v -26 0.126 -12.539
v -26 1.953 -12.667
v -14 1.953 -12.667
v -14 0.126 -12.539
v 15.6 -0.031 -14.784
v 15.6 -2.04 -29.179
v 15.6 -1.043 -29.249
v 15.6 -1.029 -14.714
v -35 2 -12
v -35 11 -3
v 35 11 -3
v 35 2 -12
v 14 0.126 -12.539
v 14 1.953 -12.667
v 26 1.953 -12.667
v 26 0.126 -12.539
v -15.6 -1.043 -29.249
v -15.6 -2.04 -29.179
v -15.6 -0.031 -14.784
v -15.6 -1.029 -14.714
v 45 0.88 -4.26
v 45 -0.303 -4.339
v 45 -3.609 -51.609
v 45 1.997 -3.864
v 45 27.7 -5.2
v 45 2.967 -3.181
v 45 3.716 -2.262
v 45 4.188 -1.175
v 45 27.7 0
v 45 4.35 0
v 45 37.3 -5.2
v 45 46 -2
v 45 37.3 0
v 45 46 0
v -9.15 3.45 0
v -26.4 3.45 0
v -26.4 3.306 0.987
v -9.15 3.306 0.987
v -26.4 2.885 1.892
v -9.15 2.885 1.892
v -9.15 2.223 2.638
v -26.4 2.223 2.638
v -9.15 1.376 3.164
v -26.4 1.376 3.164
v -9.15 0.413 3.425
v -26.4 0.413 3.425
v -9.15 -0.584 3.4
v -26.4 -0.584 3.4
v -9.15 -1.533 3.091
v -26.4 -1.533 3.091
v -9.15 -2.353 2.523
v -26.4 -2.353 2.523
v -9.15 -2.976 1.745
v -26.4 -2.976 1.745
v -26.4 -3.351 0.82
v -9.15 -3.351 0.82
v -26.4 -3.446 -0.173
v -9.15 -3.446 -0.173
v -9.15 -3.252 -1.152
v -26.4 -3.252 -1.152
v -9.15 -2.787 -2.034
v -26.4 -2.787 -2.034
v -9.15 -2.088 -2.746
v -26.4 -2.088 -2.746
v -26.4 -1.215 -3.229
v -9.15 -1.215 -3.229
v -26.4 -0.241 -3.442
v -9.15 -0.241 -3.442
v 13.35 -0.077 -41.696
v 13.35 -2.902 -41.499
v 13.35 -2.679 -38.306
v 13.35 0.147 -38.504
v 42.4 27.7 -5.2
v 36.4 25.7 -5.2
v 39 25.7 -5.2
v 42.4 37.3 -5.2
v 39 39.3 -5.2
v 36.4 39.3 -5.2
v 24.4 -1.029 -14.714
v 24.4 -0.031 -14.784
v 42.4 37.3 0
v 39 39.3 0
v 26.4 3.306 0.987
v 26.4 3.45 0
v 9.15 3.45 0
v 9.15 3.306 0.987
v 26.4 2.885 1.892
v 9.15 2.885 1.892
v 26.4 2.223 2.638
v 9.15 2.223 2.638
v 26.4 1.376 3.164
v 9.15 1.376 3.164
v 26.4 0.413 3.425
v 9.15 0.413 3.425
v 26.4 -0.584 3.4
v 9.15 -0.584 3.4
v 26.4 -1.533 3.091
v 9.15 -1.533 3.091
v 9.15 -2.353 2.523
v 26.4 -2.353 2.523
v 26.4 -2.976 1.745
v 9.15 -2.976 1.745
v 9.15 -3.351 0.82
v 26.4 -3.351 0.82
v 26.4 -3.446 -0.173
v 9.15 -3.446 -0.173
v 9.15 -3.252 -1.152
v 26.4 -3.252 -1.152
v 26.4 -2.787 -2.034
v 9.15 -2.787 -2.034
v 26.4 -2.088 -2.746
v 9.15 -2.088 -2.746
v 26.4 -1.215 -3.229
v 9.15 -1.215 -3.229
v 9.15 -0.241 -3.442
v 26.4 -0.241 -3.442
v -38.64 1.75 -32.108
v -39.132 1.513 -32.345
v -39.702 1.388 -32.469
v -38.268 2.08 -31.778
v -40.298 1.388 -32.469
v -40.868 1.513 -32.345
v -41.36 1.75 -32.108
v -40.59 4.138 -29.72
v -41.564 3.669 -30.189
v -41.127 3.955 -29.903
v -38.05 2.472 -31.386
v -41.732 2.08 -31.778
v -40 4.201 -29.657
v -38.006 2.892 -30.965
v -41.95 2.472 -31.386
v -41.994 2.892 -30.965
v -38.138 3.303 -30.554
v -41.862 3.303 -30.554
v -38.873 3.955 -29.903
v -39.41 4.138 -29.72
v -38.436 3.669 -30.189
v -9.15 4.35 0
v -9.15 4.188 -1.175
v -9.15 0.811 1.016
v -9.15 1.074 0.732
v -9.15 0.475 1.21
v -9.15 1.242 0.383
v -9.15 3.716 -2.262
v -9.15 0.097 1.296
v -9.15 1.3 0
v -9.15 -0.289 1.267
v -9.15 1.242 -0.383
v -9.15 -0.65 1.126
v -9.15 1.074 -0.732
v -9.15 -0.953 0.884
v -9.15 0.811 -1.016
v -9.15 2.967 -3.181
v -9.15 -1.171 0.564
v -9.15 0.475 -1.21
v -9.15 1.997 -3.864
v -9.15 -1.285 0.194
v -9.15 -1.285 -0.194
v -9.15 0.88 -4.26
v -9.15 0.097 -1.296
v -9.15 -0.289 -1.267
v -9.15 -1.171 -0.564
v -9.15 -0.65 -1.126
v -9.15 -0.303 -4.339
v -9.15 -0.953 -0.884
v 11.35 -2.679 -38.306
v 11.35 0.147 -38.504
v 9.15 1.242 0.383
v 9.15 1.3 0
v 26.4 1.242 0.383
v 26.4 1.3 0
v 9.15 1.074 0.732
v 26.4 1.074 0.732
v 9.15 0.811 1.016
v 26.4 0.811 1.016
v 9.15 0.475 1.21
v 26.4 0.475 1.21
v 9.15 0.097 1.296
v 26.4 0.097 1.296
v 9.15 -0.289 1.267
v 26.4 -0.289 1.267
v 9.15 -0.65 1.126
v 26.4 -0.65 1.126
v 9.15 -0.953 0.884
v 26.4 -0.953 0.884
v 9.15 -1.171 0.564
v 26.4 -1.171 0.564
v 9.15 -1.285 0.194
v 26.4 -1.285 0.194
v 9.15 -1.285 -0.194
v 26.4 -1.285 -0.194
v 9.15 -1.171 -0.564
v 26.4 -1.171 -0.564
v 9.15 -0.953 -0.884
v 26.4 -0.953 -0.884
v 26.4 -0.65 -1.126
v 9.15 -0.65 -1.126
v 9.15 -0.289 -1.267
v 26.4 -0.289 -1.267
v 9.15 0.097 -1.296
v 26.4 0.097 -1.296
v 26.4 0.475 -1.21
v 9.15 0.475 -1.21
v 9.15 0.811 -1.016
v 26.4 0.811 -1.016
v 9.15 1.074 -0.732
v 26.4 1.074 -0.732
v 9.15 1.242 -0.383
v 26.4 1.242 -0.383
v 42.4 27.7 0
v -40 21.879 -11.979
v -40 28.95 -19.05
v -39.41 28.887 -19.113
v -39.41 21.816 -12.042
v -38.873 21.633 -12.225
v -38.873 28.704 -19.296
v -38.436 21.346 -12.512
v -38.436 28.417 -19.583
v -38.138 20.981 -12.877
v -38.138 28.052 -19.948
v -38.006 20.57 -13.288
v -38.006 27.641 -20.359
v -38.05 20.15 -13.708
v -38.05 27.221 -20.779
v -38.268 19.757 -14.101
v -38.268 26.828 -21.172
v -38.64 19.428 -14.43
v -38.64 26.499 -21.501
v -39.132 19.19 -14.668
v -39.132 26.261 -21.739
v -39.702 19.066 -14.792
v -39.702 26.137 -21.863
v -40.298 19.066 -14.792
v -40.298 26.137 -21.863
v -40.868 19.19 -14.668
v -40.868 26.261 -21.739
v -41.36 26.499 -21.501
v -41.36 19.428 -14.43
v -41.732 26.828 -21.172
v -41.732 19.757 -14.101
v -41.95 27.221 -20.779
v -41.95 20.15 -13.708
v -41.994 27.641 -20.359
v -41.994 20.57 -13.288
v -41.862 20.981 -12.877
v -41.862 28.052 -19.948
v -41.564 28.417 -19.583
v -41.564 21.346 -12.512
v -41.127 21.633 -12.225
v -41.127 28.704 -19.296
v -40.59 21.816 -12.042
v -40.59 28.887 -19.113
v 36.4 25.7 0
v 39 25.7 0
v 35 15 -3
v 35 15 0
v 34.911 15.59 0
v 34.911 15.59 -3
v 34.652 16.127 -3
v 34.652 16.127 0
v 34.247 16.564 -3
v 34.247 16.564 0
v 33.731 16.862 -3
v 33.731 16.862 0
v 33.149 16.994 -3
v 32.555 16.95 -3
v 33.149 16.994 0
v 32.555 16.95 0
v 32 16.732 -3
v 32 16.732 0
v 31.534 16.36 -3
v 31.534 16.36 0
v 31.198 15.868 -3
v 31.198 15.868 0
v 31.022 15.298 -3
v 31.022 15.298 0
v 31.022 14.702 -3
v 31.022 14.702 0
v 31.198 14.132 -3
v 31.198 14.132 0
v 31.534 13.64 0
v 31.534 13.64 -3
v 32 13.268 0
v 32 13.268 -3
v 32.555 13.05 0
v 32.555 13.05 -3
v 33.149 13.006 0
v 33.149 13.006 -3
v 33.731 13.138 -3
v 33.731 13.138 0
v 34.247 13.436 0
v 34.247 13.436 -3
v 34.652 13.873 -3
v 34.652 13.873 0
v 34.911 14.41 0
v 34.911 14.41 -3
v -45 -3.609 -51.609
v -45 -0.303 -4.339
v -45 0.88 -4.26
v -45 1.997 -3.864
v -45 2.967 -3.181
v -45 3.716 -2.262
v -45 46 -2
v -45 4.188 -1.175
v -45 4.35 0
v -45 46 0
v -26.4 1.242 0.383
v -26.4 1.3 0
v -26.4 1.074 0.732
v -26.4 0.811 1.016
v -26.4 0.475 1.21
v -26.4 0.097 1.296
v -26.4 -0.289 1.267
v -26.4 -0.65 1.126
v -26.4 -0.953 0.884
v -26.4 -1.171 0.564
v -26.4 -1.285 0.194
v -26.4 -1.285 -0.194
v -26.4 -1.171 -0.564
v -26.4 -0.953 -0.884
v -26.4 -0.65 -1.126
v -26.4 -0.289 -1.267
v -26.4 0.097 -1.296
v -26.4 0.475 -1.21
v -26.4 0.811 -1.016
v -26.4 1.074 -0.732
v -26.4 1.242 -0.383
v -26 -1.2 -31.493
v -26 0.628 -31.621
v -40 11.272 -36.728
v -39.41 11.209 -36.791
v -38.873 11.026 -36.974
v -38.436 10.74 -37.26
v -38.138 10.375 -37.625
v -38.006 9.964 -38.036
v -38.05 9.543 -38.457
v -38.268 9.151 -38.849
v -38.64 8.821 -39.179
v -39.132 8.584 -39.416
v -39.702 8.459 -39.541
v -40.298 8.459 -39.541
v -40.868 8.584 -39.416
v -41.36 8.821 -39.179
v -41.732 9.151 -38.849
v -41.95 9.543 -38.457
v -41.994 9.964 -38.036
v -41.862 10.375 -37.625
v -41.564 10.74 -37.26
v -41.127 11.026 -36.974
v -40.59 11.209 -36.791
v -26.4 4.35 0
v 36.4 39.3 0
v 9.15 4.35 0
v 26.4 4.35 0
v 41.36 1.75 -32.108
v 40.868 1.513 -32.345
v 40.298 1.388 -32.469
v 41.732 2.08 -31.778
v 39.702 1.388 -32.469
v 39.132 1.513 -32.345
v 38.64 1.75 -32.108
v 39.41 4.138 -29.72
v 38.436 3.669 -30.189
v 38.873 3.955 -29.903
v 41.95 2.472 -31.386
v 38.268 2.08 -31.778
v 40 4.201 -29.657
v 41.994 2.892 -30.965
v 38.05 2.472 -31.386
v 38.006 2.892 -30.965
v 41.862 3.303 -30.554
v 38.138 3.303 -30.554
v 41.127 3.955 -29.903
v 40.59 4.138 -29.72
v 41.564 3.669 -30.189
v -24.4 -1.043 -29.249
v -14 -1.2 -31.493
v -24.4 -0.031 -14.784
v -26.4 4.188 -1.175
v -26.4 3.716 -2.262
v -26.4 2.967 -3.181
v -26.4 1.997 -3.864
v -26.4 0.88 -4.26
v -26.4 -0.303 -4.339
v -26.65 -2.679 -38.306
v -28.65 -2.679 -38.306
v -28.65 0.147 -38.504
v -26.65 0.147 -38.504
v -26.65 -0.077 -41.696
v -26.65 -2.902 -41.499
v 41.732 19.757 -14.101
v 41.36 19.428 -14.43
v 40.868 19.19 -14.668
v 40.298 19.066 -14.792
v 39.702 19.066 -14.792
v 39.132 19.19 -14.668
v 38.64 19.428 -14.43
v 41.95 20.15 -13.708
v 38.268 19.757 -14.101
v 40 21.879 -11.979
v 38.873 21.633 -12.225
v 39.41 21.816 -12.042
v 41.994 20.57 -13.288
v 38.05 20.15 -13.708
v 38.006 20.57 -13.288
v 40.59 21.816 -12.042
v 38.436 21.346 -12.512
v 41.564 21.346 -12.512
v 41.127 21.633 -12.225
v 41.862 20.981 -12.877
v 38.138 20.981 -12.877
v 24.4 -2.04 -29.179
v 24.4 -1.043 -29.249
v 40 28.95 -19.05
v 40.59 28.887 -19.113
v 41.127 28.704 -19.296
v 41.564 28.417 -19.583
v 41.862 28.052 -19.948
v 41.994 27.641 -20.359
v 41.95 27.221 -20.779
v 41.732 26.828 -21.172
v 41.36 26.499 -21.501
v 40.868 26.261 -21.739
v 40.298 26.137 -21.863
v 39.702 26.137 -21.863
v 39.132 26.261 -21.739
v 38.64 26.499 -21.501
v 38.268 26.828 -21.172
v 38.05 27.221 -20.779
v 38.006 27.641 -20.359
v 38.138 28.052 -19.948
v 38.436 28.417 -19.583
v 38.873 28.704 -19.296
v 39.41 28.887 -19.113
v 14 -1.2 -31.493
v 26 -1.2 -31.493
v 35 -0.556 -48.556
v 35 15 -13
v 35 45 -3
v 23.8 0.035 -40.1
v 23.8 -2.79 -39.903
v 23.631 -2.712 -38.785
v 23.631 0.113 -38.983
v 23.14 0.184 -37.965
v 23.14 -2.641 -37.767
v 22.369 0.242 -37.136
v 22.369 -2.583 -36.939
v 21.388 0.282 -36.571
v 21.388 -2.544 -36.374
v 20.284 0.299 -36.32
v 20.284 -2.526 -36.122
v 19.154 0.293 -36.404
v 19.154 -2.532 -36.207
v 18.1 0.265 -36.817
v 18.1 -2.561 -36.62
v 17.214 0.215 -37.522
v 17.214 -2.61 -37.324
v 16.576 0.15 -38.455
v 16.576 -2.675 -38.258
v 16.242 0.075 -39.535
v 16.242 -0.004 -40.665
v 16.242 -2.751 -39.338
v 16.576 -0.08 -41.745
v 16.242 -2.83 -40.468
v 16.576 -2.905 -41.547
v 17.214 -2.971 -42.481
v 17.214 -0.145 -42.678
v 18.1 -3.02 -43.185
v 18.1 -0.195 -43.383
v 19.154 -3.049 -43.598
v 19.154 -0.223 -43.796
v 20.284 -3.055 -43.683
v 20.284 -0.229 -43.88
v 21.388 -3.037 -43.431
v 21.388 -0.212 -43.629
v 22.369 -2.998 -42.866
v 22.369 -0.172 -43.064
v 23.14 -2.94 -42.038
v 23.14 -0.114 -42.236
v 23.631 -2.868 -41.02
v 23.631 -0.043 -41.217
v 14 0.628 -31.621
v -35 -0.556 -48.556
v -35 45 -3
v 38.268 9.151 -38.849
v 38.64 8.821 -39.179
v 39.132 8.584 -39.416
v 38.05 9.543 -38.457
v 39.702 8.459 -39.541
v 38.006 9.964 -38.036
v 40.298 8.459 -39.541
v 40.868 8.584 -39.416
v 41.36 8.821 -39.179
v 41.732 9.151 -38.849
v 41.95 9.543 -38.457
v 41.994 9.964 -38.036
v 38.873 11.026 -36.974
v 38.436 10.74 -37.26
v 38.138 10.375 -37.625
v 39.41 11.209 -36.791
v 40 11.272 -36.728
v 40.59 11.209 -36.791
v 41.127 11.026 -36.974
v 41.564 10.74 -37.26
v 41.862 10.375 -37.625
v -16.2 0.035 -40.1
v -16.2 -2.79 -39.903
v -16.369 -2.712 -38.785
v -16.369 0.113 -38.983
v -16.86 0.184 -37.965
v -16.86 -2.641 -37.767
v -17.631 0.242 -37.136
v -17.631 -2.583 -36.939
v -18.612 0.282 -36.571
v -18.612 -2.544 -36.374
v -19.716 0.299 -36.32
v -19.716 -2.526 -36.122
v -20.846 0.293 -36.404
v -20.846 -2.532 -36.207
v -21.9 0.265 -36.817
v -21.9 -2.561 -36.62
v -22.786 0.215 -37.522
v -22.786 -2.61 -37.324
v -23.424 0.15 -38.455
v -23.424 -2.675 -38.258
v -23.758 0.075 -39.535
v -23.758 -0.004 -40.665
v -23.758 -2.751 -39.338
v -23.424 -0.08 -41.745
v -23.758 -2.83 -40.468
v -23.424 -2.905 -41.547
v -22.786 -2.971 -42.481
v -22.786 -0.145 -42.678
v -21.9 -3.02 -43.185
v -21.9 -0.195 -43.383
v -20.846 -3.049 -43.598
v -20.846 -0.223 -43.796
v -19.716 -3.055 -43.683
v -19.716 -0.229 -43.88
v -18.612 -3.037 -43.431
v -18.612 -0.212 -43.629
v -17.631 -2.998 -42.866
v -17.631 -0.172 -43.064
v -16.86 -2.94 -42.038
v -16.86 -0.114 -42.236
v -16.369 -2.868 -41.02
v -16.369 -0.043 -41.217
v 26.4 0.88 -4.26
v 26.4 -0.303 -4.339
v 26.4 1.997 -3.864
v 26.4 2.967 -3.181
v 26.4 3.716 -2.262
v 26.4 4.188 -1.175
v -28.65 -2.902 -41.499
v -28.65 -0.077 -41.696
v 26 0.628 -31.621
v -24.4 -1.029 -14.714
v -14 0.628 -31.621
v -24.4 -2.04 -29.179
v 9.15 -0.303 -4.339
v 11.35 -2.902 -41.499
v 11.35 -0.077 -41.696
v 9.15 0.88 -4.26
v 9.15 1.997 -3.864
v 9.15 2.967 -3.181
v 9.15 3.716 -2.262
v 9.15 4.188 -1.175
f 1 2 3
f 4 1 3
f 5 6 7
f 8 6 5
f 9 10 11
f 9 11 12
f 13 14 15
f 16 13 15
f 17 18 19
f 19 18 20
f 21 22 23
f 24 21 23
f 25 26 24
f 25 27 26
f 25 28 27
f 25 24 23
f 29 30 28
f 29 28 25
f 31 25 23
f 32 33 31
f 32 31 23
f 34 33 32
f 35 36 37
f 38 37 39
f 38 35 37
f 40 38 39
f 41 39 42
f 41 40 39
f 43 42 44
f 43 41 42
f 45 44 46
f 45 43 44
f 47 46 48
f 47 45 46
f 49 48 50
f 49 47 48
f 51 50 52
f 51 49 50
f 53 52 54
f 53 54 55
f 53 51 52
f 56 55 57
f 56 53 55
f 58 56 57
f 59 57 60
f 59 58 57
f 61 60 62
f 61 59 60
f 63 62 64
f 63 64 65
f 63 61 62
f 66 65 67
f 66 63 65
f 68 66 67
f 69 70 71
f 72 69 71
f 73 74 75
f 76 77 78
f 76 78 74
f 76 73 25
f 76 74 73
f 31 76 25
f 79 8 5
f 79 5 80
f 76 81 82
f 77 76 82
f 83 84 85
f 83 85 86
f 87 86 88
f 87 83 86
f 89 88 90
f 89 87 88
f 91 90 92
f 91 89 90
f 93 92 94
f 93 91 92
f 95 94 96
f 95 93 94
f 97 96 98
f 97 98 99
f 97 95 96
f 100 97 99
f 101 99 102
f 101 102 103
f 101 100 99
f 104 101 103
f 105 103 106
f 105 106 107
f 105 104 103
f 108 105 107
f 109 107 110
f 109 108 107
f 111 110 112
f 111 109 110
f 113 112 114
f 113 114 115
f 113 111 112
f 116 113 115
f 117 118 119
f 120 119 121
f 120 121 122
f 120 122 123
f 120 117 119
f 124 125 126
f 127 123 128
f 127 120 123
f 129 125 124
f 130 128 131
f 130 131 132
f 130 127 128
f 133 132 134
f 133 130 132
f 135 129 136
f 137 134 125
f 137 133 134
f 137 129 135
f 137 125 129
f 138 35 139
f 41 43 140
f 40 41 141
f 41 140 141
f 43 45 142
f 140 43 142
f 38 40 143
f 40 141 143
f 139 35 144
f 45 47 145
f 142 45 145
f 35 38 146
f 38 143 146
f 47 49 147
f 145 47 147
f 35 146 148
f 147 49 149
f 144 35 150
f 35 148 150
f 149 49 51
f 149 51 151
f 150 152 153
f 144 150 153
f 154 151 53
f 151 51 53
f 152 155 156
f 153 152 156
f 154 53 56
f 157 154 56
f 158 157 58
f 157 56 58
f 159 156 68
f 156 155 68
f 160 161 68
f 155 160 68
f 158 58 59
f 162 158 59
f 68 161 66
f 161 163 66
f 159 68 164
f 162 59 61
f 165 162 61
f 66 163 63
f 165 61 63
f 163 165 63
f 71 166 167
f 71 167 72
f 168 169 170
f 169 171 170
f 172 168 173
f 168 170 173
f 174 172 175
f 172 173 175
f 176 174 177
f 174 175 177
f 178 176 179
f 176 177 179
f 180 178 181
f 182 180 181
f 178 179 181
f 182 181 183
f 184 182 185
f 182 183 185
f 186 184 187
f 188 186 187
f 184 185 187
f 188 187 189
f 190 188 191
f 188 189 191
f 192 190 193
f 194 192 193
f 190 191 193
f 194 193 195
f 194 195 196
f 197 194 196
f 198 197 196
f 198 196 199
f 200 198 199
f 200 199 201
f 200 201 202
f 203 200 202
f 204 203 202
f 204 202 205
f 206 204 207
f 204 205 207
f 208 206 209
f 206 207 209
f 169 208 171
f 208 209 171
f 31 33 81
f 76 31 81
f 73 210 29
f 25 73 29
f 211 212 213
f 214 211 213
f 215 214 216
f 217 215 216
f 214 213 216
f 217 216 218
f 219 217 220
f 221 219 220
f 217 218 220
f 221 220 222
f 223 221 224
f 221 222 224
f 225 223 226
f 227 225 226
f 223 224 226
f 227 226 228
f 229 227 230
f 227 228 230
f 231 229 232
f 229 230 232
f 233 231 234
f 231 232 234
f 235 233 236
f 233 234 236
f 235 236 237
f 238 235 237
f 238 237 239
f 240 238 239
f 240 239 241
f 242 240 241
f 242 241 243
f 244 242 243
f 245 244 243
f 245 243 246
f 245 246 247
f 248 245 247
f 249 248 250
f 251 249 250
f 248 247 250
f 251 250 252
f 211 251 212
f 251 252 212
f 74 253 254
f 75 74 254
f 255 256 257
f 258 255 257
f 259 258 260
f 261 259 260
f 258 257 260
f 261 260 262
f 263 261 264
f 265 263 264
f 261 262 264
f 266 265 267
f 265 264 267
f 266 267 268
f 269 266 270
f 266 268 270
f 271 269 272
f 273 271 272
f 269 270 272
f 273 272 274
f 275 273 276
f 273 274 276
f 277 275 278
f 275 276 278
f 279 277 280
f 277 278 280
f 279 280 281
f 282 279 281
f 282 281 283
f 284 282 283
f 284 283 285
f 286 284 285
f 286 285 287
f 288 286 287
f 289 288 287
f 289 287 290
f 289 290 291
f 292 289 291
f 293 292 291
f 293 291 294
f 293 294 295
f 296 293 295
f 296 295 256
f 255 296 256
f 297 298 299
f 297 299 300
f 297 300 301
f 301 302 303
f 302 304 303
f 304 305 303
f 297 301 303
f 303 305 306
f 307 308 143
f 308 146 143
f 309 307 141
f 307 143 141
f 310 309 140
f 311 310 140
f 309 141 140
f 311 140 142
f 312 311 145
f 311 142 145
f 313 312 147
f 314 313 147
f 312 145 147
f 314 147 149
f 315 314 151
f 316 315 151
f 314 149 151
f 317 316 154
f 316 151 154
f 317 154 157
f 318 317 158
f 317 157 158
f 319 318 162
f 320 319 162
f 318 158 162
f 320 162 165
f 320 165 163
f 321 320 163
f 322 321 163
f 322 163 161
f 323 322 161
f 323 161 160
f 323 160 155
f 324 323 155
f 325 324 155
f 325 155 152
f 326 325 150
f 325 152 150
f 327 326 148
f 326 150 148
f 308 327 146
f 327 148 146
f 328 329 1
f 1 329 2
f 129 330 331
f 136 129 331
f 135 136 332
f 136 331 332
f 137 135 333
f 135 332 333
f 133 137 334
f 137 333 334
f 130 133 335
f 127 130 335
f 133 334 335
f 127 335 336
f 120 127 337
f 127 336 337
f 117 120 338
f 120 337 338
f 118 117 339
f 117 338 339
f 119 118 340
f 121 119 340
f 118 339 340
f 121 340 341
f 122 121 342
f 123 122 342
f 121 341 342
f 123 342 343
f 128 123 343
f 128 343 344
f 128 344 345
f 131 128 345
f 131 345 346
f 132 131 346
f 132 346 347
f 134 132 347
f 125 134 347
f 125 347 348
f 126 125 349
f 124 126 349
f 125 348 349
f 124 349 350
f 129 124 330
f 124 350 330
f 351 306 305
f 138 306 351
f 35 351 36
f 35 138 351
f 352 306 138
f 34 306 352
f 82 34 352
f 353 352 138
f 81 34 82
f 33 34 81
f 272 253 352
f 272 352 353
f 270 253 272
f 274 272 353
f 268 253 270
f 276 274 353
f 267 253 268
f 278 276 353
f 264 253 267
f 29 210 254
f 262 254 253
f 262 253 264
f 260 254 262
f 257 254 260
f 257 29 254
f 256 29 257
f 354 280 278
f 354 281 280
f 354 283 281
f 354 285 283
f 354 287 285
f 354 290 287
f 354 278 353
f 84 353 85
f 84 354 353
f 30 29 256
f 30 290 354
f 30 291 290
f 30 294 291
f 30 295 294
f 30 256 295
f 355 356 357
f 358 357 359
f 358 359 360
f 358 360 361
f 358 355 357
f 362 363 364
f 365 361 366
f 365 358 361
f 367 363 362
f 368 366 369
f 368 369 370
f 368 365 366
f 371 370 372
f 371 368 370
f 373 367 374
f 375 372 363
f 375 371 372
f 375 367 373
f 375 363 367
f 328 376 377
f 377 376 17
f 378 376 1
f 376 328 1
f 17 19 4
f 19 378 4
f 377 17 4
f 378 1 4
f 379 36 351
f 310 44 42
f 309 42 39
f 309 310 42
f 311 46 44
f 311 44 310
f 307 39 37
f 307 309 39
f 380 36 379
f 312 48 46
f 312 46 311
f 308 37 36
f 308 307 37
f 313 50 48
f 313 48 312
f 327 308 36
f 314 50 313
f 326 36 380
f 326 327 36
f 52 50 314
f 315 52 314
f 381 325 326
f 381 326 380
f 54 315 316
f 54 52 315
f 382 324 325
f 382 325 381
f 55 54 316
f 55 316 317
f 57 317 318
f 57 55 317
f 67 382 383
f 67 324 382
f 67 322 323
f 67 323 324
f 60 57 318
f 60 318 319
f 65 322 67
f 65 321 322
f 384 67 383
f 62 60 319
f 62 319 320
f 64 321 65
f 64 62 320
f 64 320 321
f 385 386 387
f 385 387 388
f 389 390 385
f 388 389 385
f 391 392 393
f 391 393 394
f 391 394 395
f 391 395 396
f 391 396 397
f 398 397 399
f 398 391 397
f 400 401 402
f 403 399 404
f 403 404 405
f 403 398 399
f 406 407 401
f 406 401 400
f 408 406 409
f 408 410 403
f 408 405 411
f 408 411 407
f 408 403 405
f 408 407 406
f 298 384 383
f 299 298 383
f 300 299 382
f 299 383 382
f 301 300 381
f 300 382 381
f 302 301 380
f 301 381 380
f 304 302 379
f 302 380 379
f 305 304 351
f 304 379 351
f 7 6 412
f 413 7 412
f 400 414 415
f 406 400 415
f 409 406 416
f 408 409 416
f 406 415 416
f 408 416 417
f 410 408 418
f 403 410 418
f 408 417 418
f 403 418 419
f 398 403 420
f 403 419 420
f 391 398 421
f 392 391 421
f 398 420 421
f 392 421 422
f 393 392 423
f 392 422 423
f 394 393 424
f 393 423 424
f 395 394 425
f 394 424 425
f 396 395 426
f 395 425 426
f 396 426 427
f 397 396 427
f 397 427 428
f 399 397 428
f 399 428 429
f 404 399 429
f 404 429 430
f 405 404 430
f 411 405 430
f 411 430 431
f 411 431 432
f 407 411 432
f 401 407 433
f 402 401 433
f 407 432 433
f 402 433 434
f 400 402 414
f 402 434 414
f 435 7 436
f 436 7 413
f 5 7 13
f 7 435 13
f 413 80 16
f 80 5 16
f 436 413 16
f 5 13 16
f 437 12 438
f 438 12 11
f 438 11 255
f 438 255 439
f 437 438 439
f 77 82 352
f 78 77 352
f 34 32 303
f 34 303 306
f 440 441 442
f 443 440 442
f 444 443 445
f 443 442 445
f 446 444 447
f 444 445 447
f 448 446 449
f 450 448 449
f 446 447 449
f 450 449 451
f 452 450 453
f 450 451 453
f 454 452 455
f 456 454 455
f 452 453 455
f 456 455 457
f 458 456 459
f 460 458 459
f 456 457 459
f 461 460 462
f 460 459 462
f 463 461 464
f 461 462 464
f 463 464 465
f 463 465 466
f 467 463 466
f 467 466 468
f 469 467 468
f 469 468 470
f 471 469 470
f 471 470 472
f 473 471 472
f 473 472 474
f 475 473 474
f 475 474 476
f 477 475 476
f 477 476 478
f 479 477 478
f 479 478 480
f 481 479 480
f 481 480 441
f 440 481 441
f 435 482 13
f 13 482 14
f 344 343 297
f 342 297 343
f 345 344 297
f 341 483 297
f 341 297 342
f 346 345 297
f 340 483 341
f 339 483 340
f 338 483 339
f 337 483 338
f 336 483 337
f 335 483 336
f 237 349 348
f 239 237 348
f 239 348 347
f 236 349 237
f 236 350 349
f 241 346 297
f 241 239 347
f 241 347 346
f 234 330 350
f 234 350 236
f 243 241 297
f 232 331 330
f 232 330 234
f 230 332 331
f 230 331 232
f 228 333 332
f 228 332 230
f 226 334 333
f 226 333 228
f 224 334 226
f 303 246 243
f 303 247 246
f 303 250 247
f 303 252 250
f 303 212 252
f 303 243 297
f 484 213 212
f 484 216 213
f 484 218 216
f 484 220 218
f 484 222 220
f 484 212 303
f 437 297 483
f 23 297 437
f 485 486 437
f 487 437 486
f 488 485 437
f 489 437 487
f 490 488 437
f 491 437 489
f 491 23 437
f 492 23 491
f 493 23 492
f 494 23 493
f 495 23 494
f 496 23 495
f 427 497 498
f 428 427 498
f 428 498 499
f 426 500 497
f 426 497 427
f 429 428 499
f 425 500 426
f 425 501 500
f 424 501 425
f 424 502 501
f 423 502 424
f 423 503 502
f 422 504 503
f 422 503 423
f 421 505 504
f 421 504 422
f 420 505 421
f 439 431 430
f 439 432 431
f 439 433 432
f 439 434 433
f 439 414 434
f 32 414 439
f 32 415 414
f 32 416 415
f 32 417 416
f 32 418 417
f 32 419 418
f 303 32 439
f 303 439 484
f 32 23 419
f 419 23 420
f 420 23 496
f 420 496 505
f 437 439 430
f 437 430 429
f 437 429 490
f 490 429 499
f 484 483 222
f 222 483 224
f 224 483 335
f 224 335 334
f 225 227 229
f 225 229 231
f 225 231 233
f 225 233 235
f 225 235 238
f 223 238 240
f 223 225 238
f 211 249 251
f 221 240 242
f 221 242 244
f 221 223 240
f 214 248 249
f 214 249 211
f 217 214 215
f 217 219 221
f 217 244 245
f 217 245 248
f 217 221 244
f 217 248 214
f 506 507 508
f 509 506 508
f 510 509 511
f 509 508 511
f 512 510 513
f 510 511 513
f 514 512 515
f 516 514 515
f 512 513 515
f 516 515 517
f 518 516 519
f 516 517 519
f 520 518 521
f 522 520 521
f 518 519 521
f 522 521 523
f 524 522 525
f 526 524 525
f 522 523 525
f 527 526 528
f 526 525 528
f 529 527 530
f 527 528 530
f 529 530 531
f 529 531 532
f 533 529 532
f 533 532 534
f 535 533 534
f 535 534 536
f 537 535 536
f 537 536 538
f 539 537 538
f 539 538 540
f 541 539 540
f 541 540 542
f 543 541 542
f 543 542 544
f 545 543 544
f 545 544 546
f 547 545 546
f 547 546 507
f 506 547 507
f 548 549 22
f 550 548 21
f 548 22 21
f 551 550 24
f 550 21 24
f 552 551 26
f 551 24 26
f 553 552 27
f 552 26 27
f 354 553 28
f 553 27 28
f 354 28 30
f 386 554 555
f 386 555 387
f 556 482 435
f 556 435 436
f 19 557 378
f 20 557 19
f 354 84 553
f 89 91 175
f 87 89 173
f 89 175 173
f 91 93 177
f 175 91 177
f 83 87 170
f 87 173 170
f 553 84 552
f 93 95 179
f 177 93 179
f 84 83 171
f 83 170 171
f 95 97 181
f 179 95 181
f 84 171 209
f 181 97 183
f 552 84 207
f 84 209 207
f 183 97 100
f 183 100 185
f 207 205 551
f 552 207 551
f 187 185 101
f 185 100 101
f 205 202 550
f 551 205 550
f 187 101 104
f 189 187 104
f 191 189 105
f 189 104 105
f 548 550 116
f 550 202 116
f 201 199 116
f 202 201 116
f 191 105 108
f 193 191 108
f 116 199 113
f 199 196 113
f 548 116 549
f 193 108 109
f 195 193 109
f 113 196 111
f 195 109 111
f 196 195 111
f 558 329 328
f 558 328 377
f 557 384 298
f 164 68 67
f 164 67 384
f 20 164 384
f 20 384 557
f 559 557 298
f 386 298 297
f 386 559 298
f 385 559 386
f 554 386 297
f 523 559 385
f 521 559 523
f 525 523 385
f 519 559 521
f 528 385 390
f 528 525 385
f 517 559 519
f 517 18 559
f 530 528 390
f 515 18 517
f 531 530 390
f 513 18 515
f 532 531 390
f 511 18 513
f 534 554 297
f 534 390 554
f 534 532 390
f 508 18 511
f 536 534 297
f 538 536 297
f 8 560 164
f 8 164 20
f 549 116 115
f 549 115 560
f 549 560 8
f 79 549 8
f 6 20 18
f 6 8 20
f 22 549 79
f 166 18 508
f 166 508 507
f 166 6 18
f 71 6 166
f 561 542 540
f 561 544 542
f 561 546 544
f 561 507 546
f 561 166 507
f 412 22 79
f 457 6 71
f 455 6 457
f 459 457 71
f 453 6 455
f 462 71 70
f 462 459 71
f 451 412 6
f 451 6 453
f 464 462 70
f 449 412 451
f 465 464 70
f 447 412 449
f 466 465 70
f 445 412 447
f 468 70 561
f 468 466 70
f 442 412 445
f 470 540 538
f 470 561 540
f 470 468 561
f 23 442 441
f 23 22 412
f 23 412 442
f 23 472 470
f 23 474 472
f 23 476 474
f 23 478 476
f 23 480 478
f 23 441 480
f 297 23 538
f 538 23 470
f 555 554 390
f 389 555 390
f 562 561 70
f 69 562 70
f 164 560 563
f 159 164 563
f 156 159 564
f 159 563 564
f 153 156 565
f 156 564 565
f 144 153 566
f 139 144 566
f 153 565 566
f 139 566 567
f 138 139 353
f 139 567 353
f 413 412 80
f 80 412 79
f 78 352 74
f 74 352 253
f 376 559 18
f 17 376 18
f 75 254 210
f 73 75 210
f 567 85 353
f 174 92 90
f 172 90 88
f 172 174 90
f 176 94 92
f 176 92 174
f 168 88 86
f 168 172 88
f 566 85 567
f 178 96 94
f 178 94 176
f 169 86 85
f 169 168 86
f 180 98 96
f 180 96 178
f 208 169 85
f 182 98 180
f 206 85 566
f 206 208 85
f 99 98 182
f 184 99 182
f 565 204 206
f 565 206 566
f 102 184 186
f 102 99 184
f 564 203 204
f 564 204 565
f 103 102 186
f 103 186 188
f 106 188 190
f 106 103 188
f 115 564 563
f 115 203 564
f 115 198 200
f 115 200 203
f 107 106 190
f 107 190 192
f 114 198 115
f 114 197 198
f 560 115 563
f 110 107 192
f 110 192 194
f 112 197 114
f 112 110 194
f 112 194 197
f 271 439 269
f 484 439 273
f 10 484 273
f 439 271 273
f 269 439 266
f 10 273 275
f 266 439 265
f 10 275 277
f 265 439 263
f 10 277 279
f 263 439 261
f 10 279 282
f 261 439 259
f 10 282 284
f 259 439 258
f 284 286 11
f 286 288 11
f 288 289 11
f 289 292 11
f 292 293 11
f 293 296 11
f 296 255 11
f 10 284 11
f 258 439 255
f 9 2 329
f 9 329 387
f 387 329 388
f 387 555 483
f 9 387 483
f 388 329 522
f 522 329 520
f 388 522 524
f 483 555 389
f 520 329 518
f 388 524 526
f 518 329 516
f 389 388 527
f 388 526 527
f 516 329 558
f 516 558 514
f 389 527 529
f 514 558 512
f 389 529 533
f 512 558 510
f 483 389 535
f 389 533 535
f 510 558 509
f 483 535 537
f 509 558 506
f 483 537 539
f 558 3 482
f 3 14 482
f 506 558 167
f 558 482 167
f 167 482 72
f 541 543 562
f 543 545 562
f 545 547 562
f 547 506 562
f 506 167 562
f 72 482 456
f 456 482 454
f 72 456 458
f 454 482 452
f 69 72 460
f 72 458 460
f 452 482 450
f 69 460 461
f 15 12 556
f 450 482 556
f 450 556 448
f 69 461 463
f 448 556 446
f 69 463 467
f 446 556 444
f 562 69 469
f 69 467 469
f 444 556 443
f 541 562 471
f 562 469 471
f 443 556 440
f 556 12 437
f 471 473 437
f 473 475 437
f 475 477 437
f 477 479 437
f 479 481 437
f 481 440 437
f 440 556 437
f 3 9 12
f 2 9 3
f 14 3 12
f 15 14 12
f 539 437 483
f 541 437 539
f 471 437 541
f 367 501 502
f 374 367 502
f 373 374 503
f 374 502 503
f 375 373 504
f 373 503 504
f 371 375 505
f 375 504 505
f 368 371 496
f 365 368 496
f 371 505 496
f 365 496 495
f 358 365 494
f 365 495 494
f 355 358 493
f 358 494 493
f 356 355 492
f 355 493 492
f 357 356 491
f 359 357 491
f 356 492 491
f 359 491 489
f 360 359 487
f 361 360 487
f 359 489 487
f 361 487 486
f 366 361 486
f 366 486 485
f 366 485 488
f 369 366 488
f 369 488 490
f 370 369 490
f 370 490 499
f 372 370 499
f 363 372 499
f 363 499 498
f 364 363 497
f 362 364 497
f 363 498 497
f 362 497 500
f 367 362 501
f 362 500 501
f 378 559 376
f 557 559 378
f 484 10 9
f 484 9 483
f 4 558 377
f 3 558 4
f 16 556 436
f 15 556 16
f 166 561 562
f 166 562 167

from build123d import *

# Parameters (mm, degrees)
PAD012_DEPTH    = 45
SKETCH023_R     = 3.45
PAD013_DEPTH    = 45
SKETCH024_W     = 18.6
SKETCH024_H     = 4.35
SKETCH024_W_2   = 18.3
SKETCH025_R     = 1.3
POCKET006_DEPTH = 45
POCKET007_DEPTH = 35
SKETCH027_R     = 2
POCKET008_DEPTH = 10
POCKET020_DEPTH = 5.2
SKETCH066_R     = 3.8
SKETCH066_W     = 8.8
SKETCH066_H     = 14.5
SKETCH066_W_2   = 2
SKETCH066_H_2   = 3.2
POCKET025_DEPTH = 3
SKETCH067_R     = 2
POCKET026_DEPTH = 13
SKETCH068_W     = 12
SKETCH068_H     = 19
POCKET027_DEPTH = 2


with BuildPart() as part:
    # Sketch022 → Pad012 (new body, symmetric)
    with BuildSketch(Plane.YZ):
        Polygon((0, 0), (-3.6088417733, -51.6088417733), (46, -2), (46, 0), align=None)
    extrude(amount=PAD012_DEPTH, both=True)

    # Sketch023 → Pad013 (join, symmetric)
    with BuildSketch(Plane.YZ):
        Circle(SKETCH023_R)
    extrude(amount=PAD013_DEPTH, both=True)

    # Sketch024 → Groove003 (revolve, cut)
    with BuildSketch(Plane.XZ):
        with Locations((-35.7, 2.175)):
            Rectangle(SKETCH024_W, SKETCH024_H)
        with Locations((0, 2.175)):
            Rectangle(SKETCH024_W_2, SKETCH024_H)
        with Locations((35.7, 2.175)):
            Rectangle(SKETCH024_W, SKETCH024_H)
    revolve(axis=Axis((0, 0, 0), (1, 0, 0)), mode=Mode.SUBTRACT)

    # Sketch025 → Pocket006 (cut, symmetric)
    with BuildSketch(Plane.YZ):
        Circle(SKETCH025_R)
    extrude(amount=POCKET006_DEPTH, both=True, mode=Mode.SUBTRACT)

    # Sketch026 → Pocket007 (cut, symmetric)
    with BuildSketch(Plane.YZ):
        Polygon((2, -12), (-1.4584733661, -61.4584733661), (57, -3), (11, -3), align=None)
    extrude(amount=POCKET007_DEPTH, both=True, mode=Mode.SUBTRACT)

    # Sketch027 (on Face5 of Pocket007) → Pocket008 (cut)
    with BuildSketch(Plane(origin=(0, 24, -24), x_dir=(0, 0.7071067812, 0.7071067812), z_dir=(0, 0.7071067812, -0.7071067812))):
        with Locations((5, 40)):
            Circle(SKETCH027_R)
        with Locations((-20, 40)):
            Circle(SKETCH027_R)
        with Locations((-20, -40)):
            Circle(SKETCH027_R)
        with Locations((5, -40)):
            Circle(SKETCH027_R)
    extrude(amount=-POCKET008_DEPTH, mode=Mode.SUBTRACT)

    # Sketch060 → Pocket020 (cut)
    with BuildSketch(Plane.XY):
        Polygon((45, 37.3), (42.4, 37.3), (39, 39.3), (36.4, 39.3), (36.4, 25.7), (39, 25.7), (42.4, 27.7), (45, 27.7), align=None)
    extrude(amount=-POCKET020_DEPTH, mode=Mode.SUBTRACT)

    # Sketch066 (on DatumPlane) → Pocket025 (cut)
    with BuildSketch(Plane(origin=(0, 0, 0), x_dir=(1, 0, 0), z_dir=(0, -0.9975640503, 0.0697564737))):
        with Locations((-20, -40)):
            Circle(SKETCH066_R)
        with Locations((20, -40)):
            Circle(SKETCH066_R)
        with Locations((-20, -22)):
            Rectangle(SKETCH066_W, SKETCH066_H)
        with Locations((20, -22)):
            Rectangle(SKETCH066_W, SKETCH066_H)
        with Locations((12.35, -40)):
            Rectangle(SKETCH066_W_2, SKETCH066_H_2)
        with Locations((-27.65, -40)):
            Rectangle(SKETCH066_W_2, SKETCH066_H_2)
    extrude(amount=-POCKET025_DEPTH, mode=Mode.SUBTRACT)

    # Sketch067 → Pocket026 (cut)
    with BuildSketch(Plane.XY):
        with Locations((33, 15)):
            Circle(SKETCH067_R)
    extrude(amount=-POCKET026_DEPTH, mode=Mode.SUBTRACT)

    # Sketch068 (on DatumPlane) → Pocket027 (cut)
    with BuildSketch(Plane(origin=(0, 2.9926921508, -0.2092694212), x_dir=(1, 0, 0), z_dir=(0, -0.9975640503, 0.0697564737))):
        with Locations((-20, -22)):
            Rectangle(SKETCH068_W, SKETCH068_H)
        with Locations((20, -22)):
            Rectangle(SKETCH068_W, SKETCH068_H)
    extrude(amount=POCKET027_DEPTH, mode=Mode.SUBTRACT)


solid = part.part
